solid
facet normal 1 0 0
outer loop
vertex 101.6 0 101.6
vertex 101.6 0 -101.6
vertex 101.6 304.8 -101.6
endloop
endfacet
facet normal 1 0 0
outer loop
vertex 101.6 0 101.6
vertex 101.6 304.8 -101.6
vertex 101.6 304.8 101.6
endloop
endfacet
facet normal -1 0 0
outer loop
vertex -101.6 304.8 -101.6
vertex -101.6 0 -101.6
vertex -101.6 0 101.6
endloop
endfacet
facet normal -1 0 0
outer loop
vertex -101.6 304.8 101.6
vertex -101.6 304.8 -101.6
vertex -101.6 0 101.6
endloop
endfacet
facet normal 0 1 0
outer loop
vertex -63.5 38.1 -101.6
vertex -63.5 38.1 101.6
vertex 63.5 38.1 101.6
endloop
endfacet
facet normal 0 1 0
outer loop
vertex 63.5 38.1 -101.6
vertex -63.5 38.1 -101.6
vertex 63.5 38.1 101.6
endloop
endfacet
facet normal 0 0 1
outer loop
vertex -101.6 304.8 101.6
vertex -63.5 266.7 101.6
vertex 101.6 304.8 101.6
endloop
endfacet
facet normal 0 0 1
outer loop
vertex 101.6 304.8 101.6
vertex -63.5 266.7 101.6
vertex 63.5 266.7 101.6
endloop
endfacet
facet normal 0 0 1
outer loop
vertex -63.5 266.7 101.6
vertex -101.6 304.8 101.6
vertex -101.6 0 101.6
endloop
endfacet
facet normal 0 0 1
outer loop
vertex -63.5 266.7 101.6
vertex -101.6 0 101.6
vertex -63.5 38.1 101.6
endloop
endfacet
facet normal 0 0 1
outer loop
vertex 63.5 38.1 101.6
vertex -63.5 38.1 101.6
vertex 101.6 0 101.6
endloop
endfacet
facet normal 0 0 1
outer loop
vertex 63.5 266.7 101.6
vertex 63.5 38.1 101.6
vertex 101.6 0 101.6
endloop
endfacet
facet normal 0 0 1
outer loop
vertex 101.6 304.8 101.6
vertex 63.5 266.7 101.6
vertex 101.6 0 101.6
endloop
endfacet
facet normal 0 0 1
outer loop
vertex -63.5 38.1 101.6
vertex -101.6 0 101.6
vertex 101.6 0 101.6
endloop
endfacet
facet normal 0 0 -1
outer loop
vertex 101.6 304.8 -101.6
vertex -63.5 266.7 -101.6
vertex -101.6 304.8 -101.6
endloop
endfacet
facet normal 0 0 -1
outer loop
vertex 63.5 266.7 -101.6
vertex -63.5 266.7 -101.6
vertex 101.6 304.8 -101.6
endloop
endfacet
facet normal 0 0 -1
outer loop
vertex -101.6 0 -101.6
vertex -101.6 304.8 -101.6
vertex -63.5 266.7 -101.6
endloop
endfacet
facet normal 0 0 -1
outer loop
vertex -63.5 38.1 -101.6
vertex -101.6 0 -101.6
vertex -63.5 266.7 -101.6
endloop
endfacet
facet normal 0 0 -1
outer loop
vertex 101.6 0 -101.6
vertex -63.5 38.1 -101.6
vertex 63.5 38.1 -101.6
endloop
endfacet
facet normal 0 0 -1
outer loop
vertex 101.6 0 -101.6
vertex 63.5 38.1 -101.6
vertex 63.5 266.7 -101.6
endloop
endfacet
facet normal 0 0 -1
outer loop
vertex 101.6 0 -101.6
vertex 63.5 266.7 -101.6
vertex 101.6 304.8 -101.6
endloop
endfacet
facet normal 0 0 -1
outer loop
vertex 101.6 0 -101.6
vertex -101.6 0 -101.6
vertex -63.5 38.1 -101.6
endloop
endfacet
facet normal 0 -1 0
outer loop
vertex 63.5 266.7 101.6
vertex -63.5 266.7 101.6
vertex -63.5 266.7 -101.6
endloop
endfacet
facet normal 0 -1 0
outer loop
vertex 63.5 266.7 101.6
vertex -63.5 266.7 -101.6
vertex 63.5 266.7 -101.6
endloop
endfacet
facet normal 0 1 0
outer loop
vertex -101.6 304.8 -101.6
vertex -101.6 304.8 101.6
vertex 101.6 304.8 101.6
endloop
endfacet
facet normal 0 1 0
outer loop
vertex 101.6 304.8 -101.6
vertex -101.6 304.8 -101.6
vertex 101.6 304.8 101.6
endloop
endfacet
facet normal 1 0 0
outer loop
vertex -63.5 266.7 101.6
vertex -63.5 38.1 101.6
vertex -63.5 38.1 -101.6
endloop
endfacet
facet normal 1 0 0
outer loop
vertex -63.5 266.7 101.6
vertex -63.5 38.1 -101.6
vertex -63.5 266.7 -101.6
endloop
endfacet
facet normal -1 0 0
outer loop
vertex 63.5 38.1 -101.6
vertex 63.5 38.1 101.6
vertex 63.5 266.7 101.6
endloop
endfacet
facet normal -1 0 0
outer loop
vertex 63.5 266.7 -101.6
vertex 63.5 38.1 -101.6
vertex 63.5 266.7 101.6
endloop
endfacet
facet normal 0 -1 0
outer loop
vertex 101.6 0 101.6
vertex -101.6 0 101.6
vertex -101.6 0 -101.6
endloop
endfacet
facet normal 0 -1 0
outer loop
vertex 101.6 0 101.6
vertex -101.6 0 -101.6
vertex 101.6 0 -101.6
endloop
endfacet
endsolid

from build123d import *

# Parameters (mm, degrees)
F0_W          = 203.2
F0_H          = 203.2
F1_DEPTH      = 304.8
F2_W          = 127
F2_H          = 228.6
F3_DEPTH      = 25.4
F3_DEPTH_BACK = 203.2


with BuildPart() as f1:
    # F0 (on Front) → F1 (new body)
    with BuildSketch(Plane.XZ):
        Rectangle(F0_W, F0_H)
    extrude(amount=-F1_DEPTH)

    # F2 (on face) → F3 (cut, two sides)
    with BuildSketch(Plane.XY.offset(101.6)) as f3_sk:
        with Locations((0, 152.4)):
            Rectangle(F2_W, F2_H)
    extrude(amount=F3_DEPTH, mode=Mode.SUBTRACT)
    extrude(f3_sk.sketch, amount=-F3_DEPTH_BACK, mode=Mode.SUBTRACT)


solid = f1.part
